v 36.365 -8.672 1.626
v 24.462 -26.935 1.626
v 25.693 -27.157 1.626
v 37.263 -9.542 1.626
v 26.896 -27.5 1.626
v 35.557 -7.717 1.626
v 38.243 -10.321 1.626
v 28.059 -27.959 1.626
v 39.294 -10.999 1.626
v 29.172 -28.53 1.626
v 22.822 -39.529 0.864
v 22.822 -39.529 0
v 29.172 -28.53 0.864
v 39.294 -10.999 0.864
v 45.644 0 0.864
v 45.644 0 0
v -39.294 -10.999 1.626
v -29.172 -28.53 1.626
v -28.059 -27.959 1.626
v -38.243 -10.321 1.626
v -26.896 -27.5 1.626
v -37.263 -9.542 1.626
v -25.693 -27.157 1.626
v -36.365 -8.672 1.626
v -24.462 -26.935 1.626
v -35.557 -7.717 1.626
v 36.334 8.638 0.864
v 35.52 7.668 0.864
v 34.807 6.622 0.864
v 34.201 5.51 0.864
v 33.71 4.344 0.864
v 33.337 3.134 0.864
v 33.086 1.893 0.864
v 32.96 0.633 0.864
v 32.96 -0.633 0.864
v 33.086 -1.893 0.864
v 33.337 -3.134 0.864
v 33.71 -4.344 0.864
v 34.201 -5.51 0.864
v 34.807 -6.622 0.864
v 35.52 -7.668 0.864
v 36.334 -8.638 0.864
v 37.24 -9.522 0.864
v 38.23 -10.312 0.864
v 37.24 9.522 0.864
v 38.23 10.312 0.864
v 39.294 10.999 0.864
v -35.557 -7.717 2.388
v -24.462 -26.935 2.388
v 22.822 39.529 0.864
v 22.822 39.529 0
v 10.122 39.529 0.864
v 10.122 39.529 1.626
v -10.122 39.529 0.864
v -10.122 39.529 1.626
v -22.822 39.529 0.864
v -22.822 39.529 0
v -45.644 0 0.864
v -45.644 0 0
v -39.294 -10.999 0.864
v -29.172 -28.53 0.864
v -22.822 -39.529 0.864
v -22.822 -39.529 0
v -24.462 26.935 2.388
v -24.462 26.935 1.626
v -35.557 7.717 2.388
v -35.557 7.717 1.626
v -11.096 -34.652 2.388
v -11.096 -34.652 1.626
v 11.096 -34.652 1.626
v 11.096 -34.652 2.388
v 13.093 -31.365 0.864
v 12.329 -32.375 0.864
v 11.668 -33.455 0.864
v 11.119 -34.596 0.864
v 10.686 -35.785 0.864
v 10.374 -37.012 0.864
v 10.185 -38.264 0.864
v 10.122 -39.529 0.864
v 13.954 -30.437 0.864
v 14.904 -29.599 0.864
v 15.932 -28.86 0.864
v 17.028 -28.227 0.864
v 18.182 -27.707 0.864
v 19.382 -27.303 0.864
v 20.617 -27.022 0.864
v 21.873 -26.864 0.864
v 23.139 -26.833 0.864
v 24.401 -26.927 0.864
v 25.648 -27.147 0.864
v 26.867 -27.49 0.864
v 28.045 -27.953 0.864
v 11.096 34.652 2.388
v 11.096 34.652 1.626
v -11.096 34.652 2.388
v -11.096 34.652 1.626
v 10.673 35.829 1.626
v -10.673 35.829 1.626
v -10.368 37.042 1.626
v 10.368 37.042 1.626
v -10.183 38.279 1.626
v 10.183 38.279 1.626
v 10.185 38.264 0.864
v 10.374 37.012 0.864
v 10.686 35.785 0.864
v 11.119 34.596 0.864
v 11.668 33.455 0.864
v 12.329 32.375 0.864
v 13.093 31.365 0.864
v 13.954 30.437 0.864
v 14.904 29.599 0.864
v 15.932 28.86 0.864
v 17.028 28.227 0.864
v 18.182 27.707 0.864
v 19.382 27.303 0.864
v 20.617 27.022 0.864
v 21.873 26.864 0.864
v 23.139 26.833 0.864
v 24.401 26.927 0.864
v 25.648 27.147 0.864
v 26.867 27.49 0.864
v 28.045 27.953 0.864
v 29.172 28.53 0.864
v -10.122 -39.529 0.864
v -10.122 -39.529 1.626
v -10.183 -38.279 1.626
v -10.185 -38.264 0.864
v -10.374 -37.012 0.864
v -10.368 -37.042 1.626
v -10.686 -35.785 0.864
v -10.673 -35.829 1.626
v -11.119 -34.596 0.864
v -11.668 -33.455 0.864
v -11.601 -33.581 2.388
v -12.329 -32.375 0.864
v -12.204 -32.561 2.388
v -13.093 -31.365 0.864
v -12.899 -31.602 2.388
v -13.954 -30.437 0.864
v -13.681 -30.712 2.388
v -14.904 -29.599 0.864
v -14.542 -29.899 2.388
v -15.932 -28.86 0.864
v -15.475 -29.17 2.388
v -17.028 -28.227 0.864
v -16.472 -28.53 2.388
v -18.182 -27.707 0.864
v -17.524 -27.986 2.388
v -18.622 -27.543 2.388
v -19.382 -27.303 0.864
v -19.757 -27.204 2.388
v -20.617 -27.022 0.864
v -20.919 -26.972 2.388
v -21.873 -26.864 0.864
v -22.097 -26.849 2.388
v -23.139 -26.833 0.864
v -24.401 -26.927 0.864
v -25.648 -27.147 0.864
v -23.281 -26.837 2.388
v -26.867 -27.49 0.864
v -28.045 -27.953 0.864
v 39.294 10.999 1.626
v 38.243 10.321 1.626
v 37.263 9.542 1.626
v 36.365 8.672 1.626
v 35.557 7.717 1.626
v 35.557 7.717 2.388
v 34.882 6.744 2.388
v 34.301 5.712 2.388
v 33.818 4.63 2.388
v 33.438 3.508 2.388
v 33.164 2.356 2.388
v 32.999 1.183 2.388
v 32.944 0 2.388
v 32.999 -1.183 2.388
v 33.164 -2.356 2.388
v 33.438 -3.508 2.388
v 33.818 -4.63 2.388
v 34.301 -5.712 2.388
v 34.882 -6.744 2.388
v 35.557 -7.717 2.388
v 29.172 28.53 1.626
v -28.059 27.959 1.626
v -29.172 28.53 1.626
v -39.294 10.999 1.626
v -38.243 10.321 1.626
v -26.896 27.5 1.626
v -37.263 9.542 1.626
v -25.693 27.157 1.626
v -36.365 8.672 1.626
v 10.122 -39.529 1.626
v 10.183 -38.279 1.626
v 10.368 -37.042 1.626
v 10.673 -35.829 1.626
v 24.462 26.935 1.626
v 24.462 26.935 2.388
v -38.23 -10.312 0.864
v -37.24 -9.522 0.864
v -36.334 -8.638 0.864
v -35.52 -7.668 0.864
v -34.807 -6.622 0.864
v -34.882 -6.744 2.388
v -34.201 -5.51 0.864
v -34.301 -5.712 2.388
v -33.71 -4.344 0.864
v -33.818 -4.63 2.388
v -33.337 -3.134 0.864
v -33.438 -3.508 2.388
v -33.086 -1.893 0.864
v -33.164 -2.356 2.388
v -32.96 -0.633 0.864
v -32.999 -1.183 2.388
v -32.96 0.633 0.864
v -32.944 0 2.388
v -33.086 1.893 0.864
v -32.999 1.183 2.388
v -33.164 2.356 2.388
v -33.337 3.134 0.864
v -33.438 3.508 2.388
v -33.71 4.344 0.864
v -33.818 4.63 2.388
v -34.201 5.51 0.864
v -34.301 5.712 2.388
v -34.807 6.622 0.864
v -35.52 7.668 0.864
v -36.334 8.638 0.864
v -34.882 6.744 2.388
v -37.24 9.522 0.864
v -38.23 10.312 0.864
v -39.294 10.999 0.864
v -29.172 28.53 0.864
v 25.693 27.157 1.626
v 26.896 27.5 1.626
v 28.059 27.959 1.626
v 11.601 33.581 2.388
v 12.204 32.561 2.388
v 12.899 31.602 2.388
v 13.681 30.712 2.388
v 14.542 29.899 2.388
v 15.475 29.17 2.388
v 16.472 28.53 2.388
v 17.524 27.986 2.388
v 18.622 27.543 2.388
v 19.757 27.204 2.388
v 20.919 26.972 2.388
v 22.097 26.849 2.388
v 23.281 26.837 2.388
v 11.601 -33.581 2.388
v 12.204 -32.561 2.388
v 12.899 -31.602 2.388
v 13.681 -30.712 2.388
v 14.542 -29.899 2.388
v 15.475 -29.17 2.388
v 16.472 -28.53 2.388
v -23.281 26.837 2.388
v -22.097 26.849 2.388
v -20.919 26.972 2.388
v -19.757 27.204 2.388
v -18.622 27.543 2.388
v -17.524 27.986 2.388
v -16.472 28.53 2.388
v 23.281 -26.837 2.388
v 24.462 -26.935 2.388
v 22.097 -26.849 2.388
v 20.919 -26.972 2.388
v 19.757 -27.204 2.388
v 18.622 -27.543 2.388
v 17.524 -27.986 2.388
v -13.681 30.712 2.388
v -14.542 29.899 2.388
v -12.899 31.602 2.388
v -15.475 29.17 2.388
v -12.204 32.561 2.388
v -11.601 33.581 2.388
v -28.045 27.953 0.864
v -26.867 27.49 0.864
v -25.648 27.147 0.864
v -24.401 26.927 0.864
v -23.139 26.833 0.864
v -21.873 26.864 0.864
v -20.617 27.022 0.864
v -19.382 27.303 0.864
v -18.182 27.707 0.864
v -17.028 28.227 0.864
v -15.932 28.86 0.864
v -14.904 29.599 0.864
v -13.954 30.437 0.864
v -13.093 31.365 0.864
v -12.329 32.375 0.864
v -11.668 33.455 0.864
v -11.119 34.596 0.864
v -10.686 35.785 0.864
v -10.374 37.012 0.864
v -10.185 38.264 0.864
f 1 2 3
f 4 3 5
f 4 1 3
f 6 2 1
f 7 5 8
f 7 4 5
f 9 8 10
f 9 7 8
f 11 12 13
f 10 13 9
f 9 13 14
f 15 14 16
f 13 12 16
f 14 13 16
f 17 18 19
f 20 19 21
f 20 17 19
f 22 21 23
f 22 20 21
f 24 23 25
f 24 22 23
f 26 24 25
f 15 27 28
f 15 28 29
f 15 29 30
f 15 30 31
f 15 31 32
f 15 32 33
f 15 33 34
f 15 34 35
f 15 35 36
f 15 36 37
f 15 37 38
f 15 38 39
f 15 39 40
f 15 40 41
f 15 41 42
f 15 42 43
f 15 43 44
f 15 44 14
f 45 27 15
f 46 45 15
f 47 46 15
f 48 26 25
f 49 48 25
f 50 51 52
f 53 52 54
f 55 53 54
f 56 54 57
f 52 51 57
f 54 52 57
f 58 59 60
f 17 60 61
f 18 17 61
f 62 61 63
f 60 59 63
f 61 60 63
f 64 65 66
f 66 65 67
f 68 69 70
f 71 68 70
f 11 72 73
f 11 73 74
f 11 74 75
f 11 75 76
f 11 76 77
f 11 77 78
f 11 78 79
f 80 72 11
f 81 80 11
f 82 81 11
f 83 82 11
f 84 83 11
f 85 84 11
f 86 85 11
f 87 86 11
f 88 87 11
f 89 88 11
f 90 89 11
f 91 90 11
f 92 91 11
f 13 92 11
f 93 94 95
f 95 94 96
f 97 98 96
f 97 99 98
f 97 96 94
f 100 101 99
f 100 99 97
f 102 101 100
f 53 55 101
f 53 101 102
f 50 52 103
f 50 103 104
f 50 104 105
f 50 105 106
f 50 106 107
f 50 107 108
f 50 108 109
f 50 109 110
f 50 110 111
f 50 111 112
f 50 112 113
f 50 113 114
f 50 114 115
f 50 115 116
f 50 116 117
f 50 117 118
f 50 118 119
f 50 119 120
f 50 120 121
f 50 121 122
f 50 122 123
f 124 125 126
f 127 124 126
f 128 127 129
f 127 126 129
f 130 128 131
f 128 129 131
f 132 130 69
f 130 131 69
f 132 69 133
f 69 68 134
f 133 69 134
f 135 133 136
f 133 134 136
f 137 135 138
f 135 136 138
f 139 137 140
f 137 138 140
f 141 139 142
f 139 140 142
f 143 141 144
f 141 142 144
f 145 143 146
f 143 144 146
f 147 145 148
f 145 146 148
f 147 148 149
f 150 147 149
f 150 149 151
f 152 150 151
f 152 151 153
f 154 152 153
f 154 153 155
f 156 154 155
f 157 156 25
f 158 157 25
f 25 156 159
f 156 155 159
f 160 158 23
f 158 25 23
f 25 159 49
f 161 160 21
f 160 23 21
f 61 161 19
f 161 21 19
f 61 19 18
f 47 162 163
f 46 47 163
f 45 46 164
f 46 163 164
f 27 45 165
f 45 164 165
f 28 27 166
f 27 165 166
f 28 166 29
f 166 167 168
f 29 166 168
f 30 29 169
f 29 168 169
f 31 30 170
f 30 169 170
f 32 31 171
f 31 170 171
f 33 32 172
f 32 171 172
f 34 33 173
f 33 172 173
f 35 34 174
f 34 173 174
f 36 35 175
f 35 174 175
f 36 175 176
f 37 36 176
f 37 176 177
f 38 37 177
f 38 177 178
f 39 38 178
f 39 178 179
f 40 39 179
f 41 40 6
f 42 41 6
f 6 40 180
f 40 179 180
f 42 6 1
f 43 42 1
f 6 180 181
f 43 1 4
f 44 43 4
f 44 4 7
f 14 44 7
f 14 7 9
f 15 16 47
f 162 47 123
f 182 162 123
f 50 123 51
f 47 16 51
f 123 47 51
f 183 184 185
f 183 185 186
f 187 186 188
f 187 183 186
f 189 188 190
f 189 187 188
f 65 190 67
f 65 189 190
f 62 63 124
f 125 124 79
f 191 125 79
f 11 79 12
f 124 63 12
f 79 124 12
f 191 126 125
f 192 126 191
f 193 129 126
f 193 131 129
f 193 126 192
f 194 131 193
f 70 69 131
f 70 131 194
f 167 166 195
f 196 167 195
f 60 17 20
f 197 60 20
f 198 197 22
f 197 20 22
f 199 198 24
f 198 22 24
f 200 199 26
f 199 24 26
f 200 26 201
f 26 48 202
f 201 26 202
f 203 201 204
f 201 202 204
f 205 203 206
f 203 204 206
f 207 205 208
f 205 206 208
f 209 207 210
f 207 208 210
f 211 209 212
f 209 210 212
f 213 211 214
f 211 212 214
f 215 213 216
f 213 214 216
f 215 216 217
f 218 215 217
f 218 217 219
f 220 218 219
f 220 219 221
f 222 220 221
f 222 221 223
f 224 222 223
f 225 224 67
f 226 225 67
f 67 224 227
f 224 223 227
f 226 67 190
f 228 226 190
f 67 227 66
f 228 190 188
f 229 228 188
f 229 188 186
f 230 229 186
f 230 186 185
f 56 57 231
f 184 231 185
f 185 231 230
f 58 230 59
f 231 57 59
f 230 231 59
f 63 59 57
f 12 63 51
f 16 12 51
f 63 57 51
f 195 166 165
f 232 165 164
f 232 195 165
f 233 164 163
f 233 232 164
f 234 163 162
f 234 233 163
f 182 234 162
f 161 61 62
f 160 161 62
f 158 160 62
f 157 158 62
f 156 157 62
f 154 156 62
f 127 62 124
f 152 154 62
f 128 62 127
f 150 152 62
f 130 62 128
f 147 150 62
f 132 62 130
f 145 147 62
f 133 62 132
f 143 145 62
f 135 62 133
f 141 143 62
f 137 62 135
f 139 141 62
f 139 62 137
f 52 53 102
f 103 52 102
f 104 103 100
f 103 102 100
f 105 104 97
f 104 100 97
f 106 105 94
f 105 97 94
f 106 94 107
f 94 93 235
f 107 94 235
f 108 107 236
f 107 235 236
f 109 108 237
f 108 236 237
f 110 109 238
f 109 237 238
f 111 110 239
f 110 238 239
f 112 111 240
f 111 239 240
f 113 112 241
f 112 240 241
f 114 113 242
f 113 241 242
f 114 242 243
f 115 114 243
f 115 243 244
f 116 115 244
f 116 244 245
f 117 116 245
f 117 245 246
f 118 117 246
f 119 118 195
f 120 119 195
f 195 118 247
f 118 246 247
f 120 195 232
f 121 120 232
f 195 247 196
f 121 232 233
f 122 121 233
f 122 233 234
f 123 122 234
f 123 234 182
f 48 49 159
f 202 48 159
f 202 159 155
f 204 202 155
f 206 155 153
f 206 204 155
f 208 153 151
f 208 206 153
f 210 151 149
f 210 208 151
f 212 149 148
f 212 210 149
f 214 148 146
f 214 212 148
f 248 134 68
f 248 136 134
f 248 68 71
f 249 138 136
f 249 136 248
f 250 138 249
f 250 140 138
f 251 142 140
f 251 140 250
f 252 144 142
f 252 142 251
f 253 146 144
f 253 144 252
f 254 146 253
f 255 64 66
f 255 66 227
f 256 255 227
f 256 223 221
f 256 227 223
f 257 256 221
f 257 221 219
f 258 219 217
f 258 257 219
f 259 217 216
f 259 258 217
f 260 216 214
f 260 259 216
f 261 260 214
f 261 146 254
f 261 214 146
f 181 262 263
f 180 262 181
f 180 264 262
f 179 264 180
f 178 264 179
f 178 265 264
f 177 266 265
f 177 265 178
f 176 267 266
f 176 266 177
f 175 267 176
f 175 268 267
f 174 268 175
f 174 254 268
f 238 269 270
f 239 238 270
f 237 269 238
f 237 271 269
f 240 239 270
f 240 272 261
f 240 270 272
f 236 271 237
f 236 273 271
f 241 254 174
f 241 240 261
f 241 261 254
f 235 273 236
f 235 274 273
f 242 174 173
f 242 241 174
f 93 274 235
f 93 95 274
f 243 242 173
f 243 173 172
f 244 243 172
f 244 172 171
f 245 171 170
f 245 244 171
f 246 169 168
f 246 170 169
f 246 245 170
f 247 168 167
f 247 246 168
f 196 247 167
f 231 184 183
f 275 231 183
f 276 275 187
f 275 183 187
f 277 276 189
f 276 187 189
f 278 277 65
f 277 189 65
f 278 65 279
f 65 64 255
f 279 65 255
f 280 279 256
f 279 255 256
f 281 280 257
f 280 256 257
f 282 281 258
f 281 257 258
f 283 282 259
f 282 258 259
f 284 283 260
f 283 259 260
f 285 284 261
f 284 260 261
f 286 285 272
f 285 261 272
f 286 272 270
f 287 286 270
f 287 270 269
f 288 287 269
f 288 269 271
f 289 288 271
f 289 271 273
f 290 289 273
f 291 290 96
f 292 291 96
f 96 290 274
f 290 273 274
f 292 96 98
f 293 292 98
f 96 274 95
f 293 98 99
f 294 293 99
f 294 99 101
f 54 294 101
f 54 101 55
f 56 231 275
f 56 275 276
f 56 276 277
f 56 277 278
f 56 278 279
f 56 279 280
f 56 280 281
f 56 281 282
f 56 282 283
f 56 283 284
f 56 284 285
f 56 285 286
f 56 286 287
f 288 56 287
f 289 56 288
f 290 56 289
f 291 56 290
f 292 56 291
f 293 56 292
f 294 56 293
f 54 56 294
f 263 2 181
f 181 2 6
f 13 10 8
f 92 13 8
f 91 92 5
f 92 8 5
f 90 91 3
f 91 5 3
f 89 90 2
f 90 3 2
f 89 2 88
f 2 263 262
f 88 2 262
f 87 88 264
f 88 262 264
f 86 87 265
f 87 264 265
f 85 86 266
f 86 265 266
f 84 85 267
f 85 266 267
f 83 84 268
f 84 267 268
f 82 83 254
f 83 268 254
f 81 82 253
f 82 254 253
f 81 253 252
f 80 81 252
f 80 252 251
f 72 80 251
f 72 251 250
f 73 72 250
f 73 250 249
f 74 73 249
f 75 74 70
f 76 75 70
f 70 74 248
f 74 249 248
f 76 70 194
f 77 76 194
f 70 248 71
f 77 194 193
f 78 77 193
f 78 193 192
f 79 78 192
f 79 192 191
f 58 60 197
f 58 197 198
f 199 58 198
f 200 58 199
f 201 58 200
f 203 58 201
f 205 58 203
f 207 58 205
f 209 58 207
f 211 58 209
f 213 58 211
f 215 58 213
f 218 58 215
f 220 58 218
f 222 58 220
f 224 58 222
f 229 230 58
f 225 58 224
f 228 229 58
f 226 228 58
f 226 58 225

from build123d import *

# Parameters (mm, degrees)
F1_DEPTH = 1.6256
F3_DEPTH = 2.3876
F5_R     = 12.7
F6_DEPTH = 1.524


with BuildPart() as f1:
    # F0 (on Top) → F1 (new body)
    with BuildSketch(Plane.XY):
        Polygon((-22.8219, -39.52869), (22.8219, -39.52869), (45.6438, 0), (22.8219, 39.52869), (-22.8219, 39.52869), (-45.6438, 0), align=None)
    extrude(amount=F1_DEPTH)

    # F2 (on Top) → F3 (join)
    with BuildSketch(Plane.XY):
        Polygon((-20.006278, -34.65189), (20.006278, -34.65189), (40.012556, 0), (20.006278, 34.65189), (-20.006278, 34.65189), (-40.012556, 0), align=None)
    extrude(amount=F3_DEPTH)

    # F5 (on face) → F6 (cut)
    with BuildSketch(Plane.XY.offset(2.3876)):
        with Locations((22.8219, -39.52869)):
            Circle(F5_R)
        with Locations((45.6438, 0)):
            Circle(F5_R)
        with Locations((22.8219, 39.52869)):
            Circle(F5_R)
        with Locations((-22.8219, 39.52869)):
            Circle(F5_R)
        with Locations((-45.6438, 0)):
            Circle(F5_R)
        with Locations((-22.8219, -39.52869)):
            Circle(F5_R)
    extrude(amount=-F6_DEPTH, mode=Mode.SUBTRACT)


solid = f1.part
